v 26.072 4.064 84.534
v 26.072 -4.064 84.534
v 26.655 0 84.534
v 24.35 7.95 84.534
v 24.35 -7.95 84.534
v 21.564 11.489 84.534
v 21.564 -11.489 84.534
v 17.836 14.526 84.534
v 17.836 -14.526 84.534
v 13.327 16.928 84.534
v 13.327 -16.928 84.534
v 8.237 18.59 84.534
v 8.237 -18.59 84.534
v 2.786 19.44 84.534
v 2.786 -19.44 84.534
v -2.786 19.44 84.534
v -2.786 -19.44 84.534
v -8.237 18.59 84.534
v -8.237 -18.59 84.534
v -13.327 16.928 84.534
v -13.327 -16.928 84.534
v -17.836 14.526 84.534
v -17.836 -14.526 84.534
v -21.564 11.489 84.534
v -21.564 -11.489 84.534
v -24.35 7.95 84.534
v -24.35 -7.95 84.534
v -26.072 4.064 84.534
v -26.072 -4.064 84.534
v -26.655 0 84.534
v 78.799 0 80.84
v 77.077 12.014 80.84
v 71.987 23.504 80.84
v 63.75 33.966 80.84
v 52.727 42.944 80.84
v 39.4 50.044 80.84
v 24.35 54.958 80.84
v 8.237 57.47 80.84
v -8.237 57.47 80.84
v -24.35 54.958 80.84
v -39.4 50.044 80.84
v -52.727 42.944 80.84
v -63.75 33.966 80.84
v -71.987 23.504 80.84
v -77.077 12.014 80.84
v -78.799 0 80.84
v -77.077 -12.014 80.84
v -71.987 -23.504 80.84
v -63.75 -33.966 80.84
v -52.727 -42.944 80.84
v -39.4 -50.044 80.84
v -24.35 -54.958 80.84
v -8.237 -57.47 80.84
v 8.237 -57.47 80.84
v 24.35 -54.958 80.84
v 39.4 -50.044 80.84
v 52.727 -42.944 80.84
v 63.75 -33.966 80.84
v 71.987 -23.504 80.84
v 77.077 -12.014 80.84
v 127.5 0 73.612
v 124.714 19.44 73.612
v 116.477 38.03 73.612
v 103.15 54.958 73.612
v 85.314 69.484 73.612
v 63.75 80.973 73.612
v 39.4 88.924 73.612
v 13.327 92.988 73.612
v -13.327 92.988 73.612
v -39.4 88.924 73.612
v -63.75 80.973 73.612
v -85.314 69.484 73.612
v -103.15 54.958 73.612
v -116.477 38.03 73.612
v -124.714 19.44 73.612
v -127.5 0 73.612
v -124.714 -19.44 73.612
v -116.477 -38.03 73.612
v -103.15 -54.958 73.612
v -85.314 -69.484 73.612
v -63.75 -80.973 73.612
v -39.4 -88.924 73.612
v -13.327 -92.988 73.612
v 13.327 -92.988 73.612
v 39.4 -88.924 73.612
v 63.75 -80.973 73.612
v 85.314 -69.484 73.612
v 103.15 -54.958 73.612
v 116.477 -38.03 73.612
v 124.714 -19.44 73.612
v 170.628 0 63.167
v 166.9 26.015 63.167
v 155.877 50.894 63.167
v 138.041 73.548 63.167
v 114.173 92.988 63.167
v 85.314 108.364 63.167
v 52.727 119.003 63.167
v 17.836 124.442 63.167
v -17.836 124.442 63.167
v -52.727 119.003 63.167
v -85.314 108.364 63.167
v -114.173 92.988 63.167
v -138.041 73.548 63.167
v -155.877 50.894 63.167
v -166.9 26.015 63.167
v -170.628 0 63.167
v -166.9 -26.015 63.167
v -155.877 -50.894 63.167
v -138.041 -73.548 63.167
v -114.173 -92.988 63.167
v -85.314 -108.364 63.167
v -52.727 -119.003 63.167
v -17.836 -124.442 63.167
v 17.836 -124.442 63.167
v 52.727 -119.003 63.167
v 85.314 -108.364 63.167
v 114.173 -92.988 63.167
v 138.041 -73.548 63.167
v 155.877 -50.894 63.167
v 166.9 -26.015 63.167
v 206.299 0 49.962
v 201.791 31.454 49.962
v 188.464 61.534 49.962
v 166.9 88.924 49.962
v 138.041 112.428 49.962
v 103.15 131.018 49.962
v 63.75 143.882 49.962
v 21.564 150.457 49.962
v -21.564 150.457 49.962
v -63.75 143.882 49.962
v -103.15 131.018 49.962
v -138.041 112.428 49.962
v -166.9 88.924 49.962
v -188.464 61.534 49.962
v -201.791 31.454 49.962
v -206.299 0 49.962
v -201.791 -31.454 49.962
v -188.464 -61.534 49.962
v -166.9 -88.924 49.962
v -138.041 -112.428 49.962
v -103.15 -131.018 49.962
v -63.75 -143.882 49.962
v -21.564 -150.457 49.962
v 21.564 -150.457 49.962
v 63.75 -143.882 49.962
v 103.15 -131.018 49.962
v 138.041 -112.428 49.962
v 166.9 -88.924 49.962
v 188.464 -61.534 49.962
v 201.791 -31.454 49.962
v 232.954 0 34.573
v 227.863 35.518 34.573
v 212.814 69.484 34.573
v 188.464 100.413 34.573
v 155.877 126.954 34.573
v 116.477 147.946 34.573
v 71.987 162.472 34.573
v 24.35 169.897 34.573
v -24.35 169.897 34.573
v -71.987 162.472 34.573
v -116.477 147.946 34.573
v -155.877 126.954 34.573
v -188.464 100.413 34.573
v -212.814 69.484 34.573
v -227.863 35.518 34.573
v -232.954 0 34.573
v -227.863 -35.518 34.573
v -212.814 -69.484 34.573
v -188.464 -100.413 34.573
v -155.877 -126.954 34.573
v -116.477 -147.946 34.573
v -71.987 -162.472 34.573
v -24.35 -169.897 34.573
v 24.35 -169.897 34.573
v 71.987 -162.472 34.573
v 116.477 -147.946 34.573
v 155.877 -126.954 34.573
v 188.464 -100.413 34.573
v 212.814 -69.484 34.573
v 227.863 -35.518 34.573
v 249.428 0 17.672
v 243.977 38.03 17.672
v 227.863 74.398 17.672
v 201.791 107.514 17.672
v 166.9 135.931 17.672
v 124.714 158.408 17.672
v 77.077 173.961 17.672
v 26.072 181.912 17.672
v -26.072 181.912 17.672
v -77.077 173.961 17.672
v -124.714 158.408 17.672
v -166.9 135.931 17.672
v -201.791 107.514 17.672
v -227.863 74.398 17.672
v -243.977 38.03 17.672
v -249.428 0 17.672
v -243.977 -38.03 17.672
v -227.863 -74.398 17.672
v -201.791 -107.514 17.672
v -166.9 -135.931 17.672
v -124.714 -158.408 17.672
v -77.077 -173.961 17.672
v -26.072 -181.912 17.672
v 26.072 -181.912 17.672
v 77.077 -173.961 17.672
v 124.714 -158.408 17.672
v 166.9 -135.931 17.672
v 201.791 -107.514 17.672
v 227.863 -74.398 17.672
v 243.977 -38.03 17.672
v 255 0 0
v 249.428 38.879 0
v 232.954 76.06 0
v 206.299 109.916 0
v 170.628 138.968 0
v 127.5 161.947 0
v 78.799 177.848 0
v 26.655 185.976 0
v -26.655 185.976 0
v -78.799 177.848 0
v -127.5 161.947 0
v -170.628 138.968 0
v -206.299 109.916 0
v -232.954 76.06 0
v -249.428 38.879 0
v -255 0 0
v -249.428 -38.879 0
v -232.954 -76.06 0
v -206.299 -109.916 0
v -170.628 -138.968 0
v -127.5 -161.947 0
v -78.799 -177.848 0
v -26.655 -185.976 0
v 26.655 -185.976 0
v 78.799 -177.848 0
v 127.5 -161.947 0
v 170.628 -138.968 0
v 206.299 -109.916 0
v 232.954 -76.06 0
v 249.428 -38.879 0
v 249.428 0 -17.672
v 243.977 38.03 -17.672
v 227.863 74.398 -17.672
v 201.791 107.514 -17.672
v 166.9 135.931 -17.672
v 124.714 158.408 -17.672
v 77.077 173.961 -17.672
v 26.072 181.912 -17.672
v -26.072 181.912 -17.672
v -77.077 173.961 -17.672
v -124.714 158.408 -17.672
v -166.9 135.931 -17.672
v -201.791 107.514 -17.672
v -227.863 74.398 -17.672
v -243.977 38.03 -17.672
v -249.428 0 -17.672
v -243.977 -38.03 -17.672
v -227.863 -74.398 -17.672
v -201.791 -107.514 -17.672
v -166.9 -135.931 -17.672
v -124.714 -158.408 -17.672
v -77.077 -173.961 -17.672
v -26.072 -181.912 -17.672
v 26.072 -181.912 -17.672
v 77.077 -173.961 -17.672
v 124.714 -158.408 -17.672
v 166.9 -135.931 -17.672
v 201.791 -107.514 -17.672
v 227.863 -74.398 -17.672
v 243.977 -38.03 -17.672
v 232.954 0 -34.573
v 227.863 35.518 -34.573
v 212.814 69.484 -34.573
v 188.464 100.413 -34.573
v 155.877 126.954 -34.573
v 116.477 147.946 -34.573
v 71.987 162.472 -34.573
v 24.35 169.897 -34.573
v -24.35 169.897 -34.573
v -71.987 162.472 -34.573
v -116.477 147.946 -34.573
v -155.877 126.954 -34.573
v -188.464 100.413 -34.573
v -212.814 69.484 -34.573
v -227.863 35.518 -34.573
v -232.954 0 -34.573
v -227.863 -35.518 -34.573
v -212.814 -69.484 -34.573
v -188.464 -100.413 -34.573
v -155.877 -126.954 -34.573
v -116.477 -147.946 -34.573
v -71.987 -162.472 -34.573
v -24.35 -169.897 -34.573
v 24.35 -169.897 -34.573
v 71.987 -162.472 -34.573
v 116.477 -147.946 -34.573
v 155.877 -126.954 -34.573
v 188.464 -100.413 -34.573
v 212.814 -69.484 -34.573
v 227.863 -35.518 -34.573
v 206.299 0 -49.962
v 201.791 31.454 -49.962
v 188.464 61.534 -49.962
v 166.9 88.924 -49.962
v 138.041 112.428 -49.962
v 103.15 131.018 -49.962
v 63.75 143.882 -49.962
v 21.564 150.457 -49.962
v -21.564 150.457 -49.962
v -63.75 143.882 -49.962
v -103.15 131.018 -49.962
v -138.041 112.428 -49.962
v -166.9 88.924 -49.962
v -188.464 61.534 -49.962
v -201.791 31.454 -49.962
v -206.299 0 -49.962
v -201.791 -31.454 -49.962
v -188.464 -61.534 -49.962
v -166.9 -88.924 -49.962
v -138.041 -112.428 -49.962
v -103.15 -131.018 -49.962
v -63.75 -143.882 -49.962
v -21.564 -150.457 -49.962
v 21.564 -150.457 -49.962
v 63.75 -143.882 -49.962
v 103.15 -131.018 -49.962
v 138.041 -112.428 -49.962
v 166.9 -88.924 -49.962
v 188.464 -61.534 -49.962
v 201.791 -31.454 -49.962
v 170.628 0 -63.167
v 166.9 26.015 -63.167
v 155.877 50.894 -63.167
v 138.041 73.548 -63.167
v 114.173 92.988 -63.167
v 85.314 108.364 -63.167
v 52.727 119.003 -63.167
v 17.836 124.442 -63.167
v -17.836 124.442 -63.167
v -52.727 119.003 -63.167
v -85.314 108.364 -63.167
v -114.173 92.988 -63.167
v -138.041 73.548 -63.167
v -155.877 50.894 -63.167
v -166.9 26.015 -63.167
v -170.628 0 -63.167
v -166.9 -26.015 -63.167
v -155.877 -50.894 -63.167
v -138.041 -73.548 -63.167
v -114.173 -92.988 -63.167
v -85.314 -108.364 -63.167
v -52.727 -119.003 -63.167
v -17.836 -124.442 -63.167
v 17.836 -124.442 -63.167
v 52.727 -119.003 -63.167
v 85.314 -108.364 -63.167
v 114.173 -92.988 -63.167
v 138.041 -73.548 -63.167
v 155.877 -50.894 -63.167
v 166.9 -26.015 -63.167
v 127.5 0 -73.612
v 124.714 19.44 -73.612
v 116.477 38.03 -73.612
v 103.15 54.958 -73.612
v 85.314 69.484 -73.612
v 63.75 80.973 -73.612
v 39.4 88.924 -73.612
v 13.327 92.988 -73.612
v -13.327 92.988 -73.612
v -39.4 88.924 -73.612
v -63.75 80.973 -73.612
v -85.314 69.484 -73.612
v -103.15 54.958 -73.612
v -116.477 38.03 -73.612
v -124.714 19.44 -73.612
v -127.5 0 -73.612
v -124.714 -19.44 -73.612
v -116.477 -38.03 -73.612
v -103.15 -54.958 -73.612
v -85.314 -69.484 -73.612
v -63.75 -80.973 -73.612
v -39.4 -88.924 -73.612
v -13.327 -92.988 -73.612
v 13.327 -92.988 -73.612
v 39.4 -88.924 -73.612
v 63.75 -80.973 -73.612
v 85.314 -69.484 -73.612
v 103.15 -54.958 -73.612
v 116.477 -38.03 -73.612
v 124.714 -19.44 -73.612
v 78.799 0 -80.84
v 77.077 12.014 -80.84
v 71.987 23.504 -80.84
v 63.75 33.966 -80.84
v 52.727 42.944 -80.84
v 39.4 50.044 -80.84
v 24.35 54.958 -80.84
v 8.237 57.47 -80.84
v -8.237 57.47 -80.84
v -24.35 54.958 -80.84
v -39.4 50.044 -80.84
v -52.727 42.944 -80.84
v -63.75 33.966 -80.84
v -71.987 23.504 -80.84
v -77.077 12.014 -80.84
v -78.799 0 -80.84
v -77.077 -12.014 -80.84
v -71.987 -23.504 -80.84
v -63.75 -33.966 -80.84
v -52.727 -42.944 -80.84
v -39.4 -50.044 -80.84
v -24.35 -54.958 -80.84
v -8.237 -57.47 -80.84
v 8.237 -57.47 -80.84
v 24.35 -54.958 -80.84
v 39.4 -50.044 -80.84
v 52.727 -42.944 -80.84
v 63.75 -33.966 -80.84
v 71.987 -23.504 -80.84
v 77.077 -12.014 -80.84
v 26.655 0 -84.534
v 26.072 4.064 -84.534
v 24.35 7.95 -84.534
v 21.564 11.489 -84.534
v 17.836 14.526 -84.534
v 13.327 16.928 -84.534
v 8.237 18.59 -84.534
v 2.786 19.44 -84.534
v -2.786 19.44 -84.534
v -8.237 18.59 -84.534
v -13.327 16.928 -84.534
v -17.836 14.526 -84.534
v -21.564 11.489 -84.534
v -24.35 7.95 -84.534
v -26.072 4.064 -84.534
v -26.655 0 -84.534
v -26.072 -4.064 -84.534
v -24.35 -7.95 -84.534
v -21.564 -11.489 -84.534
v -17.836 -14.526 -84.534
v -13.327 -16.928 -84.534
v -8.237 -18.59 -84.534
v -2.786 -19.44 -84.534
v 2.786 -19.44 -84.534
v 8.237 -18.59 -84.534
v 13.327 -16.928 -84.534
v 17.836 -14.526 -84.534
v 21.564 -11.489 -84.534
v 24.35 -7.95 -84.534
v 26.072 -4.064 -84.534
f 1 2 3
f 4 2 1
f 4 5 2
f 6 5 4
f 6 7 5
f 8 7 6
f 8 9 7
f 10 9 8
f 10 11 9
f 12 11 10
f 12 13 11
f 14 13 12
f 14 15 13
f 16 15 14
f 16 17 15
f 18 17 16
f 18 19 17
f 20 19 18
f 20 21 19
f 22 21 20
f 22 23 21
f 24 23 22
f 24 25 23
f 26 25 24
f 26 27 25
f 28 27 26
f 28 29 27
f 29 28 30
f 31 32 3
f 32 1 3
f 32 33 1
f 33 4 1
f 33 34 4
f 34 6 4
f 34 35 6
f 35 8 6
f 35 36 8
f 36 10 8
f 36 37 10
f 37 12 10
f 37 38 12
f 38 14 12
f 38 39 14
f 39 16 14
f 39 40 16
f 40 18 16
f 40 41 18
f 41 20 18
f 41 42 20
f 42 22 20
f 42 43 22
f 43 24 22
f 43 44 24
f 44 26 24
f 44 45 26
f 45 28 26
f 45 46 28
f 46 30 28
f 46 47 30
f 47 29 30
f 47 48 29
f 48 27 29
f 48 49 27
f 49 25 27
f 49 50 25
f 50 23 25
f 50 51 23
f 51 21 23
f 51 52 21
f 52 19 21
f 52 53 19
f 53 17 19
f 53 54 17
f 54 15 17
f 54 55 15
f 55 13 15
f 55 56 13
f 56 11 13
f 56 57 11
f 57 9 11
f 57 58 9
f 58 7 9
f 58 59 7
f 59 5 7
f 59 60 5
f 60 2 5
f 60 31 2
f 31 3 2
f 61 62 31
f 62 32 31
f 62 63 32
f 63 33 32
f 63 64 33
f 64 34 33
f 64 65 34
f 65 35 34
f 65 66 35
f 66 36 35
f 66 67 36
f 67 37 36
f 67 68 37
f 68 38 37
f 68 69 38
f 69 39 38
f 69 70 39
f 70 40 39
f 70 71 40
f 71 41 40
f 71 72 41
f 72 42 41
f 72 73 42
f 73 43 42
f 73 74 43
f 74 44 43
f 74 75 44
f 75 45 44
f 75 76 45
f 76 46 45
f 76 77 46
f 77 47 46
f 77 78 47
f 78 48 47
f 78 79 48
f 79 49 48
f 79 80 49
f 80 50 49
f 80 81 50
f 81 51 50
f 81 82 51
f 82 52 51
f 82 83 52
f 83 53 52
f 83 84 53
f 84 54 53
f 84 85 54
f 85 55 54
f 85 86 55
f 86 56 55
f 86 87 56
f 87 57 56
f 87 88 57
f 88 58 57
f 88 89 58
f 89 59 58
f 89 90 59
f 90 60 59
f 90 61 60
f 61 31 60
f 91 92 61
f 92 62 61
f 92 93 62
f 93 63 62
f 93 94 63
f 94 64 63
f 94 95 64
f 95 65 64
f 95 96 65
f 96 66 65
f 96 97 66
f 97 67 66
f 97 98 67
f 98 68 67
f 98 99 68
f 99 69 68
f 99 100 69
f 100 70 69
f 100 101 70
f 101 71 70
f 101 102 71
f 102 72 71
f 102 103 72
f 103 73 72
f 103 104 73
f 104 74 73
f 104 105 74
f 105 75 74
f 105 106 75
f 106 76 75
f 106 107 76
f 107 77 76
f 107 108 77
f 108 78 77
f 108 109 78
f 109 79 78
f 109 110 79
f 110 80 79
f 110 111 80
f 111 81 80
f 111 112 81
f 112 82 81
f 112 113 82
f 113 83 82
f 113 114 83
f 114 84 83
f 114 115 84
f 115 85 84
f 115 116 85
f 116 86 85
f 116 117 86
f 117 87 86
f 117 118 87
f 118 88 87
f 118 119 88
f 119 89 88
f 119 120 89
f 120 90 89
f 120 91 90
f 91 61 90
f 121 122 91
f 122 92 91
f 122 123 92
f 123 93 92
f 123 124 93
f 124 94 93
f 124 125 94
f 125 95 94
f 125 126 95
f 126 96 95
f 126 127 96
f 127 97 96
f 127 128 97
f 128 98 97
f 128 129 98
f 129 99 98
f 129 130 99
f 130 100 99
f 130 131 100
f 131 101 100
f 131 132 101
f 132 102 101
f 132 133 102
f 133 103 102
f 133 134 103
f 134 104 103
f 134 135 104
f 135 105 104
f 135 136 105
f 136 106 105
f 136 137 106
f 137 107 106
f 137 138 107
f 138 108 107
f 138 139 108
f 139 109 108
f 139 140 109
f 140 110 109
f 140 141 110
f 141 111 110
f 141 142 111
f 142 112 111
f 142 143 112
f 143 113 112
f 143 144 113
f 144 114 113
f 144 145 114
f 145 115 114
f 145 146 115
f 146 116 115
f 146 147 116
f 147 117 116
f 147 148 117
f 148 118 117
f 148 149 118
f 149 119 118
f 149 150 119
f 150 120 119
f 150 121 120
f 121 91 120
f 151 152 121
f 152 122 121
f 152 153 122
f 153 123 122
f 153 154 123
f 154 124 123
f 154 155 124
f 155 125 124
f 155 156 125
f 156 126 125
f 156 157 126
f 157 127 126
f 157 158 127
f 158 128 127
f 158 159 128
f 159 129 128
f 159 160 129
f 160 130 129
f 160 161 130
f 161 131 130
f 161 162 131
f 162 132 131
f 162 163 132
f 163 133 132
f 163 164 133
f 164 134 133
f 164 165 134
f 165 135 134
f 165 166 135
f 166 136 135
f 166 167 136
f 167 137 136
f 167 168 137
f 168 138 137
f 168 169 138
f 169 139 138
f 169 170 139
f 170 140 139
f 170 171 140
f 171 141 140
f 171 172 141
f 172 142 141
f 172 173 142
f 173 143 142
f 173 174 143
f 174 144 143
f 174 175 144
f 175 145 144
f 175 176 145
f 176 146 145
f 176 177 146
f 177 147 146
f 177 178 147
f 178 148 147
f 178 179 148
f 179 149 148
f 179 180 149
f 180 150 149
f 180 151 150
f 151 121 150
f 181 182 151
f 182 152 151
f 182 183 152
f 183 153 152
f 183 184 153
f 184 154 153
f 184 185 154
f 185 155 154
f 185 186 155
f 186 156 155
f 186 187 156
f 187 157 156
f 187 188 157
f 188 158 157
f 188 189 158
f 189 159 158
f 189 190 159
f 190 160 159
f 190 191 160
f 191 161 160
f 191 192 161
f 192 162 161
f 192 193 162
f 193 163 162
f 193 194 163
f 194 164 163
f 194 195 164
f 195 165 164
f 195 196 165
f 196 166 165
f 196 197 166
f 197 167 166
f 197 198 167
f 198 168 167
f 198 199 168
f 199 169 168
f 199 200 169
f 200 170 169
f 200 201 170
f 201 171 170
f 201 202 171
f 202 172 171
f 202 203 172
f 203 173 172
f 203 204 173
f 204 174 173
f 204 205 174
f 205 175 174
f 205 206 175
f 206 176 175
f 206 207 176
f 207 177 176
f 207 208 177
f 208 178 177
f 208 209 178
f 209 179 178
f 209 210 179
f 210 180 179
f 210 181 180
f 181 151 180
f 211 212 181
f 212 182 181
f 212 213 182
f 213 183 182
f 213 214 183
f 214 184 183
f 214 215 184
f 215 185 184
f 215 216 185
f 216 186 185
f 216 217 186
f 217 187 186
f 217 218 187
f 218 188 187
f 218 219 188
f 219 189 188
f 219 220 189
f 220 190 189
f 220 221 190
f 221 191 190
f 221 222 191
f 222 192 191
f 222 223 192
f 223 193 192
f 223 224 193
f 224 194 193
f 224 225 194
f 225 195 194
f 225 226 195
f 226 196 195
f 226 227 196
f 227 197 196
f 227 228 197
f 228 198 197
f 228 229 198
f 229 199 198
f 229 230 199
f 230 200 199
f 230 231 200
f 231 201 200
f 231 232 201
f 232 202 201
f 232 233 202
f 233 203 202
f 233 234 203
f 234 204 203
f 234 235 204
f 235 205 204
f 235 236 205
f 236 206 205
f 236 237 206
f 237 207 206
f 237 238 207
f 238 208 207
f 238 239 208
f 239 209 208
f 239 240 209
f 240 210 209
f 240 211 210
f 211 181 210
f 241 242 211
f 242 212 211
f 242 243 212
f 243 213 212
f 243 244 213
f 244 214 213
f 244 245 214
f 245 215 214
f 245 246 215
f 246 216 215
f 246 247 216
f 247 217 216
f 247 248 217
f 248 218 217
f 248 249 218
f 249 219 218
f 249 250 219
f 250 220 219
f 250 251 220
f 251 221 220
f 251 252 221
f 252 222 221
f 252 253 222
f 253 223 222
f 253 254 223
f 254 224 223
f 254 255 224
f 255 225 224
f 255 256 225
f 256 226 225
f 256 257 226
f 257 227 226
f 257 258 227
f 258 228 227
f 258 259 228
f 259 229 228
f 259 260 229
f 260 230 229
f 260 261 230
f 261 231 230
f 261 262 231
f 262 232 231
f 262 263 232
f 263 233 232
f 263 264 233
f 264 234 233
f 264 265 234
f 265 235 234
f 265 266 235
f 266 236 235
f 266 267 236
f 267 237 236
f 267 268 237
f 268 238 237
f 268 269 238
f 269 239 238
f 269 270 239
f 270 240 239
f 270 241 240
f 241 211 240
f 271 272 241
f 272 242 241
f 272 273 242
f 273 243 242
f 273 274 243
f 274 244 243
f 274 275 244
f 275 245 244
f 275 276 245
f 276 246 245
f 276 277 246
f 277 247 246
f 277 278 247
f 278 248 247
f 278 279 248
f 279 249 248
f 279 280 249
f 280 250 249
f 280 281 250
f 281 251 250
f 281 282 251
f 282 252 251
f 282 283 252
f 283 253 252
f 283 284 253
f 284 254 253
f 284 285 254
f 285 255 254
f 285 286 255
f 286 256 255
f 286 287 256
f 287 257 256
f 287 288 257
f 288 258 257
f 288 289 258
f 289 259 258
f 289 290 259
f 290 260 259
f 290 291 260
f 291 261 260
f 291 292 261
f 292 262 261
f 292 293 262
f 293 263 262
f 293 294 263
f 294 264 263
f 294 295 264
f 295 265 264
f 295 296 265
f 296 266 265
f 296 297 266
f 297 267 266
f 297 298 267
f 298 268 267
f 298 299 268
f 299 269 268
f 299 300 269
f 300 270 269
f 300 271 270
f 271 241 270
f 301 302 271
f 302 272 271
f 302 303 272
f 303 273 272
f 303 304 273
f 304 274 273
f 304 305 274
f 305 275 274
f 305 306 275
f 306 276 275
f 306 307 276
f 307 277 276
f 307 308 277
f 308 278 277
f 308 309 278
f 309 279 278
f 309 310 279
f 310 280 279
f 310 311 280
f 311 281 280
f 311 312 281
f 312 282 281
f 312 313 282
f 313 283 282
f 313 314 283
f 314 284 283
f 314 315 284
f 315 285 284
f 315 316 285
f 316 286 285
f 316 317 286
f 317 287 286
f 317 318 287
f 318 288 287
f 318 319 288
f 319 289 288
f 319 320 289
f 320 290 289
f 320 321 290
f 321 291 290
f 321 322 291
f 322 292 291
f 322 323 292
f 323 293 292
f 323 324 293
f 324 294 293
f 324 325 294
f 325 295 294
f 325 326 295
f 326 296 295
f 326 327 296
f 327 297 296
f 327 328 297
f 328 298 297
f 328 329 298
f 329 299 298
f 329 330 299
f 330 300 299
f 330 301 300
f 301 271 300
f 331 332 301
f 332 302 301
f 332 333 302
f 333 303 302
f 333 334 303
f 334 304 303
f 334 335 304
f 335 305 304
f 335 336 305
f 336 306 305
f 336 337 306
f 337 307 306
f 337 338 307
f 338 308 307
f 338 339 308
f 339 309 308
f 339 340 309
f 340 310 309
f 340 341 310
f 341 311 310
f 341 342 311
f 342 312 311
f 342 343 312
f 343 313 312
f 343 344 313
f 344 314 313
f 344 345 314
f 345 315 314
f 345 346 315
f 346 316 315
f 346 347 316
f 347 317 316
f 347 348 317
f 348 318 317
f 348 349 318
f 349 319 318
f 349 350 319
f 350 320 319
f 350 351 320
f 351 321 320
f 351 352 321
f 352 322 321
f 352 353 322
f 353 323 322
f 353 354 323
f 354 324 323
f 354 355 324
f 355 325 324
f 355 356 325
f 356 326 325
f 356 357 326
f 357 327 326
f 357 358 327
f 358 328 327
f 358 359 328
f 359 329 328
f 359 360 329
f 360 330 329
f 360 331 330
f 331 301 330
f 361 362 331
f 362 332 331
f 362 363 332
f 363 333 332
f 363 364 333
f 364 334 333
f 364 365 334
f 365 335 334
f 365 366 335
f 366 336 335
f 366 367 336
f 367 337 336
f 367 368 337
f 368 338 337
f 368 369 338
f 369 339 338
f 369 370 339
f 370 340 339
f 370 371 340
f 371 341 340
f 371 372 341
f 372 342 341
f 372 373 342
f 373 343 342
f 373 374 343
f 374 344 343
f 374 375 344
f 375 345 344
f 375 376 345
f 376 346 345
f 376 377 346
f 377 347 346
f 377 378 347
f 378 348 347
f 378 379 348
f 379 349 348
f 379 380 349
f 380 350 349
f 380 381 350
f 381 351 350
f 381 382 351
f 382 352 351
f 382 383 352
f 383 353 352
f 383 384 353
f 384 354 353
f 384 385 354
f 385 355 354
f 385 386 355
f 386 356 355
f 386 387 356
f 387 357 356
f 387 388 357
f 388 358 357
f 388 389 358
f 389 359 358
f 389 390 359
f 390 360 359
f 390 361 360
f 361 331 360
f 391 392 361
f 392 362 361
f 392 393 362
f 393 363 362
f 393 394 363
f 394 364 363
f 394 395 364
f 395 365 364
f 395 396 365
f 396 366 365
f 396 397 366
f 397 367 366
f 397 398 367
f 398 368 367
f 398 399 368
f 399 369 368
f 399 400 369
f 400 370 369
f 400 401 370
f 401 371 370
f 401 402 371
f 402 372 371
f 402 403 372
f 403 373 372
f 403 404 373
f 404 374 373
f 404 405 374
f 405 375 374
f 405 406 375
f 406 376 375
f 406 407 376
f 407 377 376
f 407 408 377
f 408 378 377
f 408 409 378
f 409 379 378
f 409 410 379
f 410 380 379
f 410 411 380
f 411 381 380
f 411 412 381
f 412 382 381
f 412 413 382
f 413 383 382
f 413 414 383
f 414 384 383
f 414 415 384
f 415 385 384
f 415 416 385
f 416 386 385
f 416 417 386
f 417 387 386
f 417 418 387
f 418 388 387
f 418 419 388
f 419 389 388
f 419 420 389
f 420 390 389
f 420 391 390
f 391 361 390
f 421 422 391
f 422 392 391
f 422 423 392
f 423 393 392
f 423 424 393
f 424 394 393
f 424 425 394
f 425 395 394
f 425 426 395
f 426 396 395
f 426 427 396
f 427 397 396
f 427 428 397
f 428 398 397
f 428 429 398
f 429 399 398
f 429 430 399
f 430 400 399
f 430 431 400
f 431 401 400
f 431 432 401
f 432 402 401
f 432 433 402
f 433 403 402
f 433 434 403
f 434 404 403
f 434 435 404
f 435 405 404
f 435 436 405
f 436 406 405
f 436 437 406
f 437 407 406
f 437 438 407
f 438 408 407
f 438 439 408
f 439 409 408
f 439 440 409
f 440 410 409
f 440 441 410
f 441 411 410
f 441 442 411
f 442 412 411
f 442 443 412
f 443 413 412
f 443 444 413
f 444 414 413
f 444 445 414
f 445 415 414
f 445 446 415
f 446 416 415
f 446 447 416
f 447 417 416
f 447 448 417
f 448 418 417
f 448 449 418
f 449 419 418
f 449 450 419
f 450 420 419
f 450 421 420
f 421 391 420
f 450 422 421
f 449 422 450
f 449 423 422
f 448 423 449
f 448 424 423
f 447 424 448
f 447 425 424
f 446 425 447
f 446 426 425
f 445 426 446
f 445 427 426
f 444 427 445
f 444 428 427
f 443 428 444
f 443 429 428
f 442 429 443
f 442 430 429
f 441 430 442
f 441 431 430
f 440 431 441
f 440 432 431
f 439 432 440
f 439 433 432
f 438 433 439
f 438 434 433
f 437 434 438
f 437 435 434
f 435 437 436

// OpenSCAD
// Generated by SolidPython 1.0.1 on 2020-07-29 00:46:52


scale(v = [15, 11, 5]) {
	sphere(r = 17);
}
/***********************************************
*********      SolidPython code:      **********
************************************************
 
# import packages: SolidPython
from solid import *
from solid.utils import *
from itertools import chain, combinations, permutations


class Resize:

    def __init__(self, scad_file):
        self.scad_file = scad_file
        #self.scad_file = import_scad(scad_file)
        # cone/cylinder param:
        self.r1 = 0
        self.r2 = 0
        self.h = 0
        # rectangular prism param:
        self.w = 0
        self.l = 0
        # ellipse param:
        self.r = 0

    # import OpenScad code (file name corresponds to shape)


    # classify shape + parameters
    def assign(self, param1, param2, param3):
        if self.scad_file == 'cone.scad':
            self.r1 = param1
            self.r2 = param2
            self.h = param3
        elif self.scad_file == 'cylinder.scad':
            self.r1 = param1
            self.r2 = param2
            self.h = param3
        elif self.scad_file == 'rectangularPrism.scad':
            self.h = param1
            self.l = param2
            self.w = param3
        else:
            self.r = param1
            self.h = param2

    # resize parameters
    def iterate(self):
        x = range(3, 20, 2)
        i = 1
        if self.scad_file == 'cone.scad':
            tempList = list(permutations(x, 2))
            for temp in tempList:
                param1 = temp[0]
                param2 = temp[1]
                filepath = 'produced_scad_files/' + 'cone' + str(param1) + '_' + str(param2) + '_' + '.scad'
                scad_render_to_file(cylinder(h=param1, r1=param2, r2=0), filepath)

        elif self.scad_file == 'cylinder.scad':
            tempList = list(permutations(x, 3))
            for temp in tempList:
                param1 = temp[0]
                param2 = temp[1]
                filepath = 'produced_scad_files/' + 'cylinder' + str(param1) + '_' + str(param2) + '_' + '.scad'
                scad_render_to_file(cylinder(h=param1, r1=param2, r2=param2), filepath)

        elif self.scad_file == 'rectangularPrism.scad':
            tempList = list(permutations(x, 3))
            for temp in tempList:
                param1 = temp[0]
                param2 = temp[1]
                param3 = temp[2]
                filepath = 'produced_scad_files/' + 'rectangularPrism' + str(param1) + '_' + str(param2) + '_' + str(
                    param3) + '.scad'
                scad_render_to_file(cube(size=(param1, param2, param3)), filepath)

        elif self.scad_file == 'ellipse.scad':
            tempList = list(permutations(x, 4))
            for temp in tempList:
                param1 = temp[0]
                param2 = temp[1]
                param3 = temp[2]
                param4 = temp[3]
                filepath = 'produced_scad_files/' + 'ellipse' + str(param1) + '_' + str(param2) + '_' + str(param3) + '_' + str(param4) + '.scad'
                scad_render_to_file(scale([param1, param2, param3])(sphere(r=param4)), filepath)

    def render_to_scadfile(self):
        scad_render_to_file(scad, 'example.scad') 
 
************************************************/
